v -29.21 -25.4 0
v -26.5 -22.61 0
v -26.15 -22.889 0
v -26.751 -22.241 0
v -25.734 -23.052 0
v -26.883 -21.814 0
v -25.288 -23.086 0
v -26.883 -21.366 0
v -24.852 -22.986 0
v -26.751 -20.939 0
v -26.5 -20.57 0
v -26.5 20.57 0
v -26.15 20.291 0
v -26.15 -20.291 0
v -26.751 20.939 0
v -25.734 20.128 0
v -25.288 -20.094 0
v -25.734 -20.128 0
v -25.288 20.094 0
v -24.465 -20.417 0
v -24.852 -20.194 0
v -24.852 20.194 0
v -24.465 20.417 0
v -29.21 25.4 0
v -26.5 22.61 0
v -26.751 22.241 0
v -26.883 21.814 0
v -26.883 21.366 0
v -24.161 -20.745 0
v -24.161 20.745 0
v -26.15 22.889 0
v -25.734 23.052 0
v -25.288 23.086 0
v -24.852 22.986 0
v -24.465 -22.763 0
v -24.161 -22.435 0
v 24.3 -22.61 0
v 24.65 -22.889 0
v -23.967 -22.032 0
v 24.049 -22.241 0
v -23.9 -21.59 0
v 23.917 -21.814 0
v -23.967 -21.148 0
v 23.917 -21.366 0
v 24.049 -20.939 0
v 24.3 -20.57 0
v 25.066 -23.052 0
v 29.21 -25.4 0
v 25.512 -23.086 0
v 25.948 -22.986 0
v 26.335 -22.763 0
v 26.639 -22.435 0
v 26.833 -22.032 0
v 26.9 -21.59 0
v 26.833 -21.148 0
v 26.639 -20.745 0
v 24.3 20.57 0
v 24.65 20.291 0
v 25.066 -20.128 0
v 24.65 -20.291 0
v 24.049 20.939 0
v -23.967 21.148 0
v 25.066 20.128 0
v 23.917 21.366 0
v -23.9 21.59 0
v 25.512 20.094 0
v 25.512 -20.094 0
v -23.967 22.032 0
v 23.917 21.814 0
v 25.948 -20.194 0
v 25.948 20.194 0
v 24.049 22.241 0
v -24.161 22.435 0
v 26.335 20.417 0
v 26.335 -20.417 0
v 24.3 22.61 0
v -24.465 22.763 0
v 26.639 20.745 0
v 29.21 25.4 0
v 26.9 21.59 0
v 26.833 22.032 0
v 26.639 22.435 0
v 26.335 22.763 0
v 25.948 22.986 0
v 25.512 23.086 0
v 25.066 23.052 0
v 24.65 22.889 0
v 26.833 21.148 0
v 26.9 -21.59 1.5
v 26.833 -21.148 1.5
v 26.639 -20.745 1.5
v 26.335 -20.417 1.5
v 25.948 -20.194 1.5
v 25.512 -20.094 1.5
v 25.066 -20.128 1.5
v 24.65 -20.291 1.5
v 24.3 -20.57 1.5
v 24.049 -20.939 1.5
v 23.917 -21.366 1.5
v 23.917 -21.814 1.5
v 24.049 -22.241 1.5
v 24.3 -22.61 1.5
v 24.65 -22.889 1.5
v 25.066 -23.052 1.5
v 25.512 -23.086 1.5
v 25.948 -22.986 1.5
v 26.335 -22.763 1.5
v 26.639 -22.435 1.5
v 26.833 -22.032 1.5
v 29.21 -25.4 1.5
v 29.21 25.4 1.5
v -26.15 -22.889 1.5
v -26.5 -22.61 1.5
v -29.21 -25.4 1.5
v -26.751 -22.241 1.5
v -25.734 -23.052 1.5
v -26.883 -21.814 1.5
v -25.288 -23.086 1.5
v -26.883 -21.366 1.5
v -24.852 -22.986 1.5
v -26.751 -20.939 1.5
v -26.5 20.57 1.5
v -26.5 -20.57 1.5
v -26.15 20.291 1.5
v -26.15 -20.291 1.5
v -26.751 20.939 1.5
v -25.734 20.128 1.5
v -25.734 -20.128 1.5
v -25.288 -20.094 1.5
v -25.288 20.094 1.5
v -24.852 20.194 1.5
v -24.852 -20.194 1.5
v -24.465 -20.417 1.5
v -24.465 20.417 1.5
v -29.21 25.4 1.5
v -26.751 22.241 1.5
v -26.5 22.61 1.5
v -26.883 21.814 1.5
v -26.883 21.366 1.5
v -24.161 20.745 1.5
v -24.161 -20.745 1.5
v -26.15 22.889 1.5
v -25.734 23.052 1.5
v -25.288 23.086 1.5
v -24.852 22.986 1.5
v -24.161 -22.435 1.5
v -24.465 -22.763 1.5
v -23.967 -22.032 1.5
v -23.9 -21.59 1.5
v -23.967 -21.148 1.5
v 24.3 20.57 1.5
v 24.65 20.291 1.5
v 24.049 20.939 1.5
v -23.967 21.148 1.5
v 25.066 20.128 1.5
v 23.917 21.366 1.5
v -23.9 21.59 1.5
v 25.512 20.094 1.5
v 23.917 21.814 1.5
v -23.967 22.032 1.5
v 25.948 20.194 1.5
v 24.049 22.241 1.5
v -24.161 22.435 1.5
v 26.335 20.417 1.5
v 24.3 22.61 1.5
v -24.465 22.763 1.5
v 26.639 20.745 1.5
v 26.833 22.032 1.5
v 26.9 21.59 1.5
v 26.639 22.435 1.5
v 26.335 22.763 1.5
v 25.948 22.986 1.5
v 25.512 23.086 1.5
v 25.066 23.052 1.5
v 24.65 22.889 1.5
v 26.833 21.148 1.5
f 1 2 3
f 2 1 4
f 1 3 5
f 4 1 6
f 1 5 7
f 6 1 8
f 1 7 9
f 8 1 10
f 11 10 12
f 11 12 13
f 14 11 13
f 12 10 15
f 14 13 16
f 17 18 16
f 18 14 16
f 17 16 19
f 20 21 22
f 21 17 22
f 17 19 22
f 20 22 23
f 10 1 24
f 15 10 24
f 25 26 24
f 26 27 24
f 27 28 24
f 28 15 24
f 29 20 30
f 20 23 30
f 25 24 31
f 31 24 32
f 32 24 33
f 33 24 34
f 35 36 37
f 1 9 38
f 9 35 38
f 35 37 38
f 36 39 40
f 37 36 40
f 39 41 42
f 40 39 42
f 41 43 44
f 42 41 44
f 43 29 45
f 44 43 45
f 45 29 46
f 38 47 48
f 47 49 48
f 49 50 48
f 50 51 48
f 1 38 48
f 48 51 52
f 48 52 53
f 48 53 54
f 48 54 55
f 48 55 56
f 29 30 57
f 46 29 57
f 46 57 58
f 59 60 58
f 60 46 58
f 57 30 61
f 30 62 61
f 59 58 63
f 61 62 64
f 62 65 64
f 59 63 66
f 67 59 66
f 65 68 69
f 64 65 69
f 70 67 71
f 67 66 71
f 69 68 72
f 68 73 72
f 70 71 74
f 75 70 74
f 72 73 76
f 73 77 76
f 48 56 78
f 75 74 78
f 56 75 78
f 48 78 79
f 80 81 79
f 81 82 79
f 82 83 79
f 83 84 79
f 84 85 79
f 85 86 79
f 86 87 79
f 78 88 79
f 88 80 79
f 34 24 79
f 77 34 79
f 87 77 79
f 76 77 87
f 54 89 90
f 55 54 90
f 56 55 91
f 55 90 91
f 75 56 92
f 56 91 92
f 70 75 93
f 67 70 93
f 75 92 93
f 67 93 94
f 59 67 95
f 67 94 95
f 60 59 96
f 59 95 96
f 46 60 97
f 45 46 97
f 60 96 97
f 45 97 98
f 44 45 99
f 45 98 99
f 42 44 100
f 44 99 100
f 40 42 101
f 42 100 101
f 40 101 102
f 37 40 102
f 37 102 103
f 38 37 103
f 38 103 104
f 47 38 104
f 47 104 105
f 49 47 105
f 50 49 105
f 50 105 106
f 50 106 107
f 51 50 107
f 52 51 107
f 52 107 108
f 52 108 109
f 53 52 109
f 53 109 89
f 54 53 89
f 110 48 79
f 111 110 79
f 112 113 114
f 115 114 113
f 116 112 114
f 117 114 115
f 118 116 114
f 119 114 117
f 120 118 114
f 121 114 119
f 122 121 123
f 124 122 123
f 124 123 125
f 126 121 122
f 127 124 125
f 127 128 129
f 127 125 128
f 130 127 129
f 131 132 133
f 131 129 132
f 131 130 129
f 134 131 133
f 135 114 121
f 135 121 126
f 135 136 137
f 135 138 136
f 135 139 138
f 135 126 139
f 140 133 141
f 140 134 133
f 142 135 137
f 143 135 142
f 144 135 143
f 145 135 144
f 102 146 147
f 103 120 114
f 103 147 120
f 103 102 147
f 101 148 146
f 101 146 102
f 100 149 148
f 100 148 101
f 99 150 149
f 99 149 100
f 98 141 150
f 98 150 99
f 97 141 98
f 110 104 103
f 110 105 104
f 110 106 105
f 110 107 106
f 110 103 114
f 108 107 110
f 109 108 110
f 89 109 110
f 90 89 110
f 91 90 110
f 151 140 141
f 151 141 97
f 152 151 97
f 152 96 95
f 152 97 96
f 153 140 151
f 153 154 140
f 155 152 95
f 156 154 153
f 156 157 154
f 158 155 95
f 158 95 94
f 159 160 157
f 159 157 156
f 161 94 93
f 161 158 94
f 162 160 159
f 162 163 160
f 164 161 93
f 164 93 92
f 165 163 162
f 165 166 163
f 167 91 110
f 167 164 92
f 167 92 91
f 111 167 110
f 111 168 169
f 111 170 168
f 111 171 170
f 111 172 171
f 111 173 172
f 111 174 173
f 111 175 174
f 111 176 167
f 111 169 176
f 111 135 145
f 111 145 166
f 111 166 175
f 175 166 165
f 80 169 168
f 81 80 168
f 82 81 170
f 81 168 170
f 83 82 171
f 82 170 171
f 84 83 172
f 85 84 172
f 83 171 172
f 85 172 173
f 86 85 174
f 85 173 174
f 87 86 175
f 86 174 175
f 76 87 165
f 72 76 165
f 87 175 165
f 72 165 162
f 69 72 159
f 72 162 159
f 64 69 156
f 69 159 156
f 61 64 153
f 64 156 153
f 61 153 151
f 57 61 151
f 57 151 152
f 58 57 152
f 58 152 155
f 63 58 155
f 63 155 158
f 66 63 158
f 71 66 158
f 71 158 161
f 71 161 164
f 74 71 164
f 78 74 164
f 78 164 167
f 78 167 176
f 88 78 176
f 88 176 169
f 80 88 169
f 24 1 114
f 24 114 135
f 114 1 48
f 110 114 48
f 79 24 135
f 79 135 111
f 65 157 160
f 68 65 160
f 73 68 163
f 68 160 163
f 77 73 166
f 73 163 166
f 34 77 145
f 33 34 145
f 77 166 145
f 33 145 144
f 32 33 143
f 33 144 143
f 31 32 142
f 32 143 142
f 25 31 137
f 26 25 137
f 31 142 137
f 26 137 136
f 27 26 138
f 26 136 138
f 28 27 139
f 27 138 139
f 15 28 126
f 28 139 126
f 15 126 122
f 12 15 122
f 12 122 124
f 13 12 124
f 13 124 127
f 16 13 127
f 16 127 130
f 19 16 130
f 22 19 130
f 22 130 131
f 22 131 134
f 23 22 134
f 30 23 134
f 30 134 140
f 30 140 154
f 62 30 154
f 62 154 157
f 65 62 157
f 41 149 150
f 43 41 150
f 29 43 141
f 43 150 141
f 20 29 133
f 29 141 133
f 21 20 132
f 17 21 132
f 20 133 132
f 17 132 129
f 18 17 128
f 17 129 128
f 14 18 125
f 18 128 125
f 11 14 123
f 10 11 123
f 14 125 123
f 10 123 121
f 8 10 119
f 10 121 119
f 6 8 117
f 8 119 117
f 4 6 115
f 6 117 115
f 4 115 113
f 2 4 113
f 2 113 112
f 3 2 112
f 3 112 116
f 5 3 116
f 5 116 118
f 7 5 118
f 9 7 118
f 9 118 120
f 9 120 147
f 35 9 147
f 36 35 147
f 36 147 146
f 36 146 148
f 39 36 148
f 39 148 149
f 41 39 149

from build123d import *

# Parameters (mm, degrees)
SKETCH_W     = 58.42
SKETCH_H     = 50.8
PAD_DEPTH    = 1.5
SKETCH001_R  = 1.5
POCKET_DEPTH = 5


with BuildPart() as part:
    # Sketch → Pad (new body)
    with BuildSketch(Plane.XY):
        Rectangle(SKETCH_W, SKETCH_H)
    extrude(amount=PAD_DEPTH)

    # Sketch001 → Pocket (cut)
    with BuildSketch(Plane.XY.offset(1.5)):
        with Locations((-25.4, 21.59)):
            Circle(SKETCH001_R)
        with Locations((25.4, 21.59)):
            Circle(SKETCH001_R)
        with Locations((25.4, -21.59)):
            Circle(SKETCH001_R)
        with Locations((-25.4, -21.59)):
            Circle(SKETCH001_R)
    extrude(amount=-POCKET_DEPTH, mode=Mode.SUBTRACT)


solid = part.part
